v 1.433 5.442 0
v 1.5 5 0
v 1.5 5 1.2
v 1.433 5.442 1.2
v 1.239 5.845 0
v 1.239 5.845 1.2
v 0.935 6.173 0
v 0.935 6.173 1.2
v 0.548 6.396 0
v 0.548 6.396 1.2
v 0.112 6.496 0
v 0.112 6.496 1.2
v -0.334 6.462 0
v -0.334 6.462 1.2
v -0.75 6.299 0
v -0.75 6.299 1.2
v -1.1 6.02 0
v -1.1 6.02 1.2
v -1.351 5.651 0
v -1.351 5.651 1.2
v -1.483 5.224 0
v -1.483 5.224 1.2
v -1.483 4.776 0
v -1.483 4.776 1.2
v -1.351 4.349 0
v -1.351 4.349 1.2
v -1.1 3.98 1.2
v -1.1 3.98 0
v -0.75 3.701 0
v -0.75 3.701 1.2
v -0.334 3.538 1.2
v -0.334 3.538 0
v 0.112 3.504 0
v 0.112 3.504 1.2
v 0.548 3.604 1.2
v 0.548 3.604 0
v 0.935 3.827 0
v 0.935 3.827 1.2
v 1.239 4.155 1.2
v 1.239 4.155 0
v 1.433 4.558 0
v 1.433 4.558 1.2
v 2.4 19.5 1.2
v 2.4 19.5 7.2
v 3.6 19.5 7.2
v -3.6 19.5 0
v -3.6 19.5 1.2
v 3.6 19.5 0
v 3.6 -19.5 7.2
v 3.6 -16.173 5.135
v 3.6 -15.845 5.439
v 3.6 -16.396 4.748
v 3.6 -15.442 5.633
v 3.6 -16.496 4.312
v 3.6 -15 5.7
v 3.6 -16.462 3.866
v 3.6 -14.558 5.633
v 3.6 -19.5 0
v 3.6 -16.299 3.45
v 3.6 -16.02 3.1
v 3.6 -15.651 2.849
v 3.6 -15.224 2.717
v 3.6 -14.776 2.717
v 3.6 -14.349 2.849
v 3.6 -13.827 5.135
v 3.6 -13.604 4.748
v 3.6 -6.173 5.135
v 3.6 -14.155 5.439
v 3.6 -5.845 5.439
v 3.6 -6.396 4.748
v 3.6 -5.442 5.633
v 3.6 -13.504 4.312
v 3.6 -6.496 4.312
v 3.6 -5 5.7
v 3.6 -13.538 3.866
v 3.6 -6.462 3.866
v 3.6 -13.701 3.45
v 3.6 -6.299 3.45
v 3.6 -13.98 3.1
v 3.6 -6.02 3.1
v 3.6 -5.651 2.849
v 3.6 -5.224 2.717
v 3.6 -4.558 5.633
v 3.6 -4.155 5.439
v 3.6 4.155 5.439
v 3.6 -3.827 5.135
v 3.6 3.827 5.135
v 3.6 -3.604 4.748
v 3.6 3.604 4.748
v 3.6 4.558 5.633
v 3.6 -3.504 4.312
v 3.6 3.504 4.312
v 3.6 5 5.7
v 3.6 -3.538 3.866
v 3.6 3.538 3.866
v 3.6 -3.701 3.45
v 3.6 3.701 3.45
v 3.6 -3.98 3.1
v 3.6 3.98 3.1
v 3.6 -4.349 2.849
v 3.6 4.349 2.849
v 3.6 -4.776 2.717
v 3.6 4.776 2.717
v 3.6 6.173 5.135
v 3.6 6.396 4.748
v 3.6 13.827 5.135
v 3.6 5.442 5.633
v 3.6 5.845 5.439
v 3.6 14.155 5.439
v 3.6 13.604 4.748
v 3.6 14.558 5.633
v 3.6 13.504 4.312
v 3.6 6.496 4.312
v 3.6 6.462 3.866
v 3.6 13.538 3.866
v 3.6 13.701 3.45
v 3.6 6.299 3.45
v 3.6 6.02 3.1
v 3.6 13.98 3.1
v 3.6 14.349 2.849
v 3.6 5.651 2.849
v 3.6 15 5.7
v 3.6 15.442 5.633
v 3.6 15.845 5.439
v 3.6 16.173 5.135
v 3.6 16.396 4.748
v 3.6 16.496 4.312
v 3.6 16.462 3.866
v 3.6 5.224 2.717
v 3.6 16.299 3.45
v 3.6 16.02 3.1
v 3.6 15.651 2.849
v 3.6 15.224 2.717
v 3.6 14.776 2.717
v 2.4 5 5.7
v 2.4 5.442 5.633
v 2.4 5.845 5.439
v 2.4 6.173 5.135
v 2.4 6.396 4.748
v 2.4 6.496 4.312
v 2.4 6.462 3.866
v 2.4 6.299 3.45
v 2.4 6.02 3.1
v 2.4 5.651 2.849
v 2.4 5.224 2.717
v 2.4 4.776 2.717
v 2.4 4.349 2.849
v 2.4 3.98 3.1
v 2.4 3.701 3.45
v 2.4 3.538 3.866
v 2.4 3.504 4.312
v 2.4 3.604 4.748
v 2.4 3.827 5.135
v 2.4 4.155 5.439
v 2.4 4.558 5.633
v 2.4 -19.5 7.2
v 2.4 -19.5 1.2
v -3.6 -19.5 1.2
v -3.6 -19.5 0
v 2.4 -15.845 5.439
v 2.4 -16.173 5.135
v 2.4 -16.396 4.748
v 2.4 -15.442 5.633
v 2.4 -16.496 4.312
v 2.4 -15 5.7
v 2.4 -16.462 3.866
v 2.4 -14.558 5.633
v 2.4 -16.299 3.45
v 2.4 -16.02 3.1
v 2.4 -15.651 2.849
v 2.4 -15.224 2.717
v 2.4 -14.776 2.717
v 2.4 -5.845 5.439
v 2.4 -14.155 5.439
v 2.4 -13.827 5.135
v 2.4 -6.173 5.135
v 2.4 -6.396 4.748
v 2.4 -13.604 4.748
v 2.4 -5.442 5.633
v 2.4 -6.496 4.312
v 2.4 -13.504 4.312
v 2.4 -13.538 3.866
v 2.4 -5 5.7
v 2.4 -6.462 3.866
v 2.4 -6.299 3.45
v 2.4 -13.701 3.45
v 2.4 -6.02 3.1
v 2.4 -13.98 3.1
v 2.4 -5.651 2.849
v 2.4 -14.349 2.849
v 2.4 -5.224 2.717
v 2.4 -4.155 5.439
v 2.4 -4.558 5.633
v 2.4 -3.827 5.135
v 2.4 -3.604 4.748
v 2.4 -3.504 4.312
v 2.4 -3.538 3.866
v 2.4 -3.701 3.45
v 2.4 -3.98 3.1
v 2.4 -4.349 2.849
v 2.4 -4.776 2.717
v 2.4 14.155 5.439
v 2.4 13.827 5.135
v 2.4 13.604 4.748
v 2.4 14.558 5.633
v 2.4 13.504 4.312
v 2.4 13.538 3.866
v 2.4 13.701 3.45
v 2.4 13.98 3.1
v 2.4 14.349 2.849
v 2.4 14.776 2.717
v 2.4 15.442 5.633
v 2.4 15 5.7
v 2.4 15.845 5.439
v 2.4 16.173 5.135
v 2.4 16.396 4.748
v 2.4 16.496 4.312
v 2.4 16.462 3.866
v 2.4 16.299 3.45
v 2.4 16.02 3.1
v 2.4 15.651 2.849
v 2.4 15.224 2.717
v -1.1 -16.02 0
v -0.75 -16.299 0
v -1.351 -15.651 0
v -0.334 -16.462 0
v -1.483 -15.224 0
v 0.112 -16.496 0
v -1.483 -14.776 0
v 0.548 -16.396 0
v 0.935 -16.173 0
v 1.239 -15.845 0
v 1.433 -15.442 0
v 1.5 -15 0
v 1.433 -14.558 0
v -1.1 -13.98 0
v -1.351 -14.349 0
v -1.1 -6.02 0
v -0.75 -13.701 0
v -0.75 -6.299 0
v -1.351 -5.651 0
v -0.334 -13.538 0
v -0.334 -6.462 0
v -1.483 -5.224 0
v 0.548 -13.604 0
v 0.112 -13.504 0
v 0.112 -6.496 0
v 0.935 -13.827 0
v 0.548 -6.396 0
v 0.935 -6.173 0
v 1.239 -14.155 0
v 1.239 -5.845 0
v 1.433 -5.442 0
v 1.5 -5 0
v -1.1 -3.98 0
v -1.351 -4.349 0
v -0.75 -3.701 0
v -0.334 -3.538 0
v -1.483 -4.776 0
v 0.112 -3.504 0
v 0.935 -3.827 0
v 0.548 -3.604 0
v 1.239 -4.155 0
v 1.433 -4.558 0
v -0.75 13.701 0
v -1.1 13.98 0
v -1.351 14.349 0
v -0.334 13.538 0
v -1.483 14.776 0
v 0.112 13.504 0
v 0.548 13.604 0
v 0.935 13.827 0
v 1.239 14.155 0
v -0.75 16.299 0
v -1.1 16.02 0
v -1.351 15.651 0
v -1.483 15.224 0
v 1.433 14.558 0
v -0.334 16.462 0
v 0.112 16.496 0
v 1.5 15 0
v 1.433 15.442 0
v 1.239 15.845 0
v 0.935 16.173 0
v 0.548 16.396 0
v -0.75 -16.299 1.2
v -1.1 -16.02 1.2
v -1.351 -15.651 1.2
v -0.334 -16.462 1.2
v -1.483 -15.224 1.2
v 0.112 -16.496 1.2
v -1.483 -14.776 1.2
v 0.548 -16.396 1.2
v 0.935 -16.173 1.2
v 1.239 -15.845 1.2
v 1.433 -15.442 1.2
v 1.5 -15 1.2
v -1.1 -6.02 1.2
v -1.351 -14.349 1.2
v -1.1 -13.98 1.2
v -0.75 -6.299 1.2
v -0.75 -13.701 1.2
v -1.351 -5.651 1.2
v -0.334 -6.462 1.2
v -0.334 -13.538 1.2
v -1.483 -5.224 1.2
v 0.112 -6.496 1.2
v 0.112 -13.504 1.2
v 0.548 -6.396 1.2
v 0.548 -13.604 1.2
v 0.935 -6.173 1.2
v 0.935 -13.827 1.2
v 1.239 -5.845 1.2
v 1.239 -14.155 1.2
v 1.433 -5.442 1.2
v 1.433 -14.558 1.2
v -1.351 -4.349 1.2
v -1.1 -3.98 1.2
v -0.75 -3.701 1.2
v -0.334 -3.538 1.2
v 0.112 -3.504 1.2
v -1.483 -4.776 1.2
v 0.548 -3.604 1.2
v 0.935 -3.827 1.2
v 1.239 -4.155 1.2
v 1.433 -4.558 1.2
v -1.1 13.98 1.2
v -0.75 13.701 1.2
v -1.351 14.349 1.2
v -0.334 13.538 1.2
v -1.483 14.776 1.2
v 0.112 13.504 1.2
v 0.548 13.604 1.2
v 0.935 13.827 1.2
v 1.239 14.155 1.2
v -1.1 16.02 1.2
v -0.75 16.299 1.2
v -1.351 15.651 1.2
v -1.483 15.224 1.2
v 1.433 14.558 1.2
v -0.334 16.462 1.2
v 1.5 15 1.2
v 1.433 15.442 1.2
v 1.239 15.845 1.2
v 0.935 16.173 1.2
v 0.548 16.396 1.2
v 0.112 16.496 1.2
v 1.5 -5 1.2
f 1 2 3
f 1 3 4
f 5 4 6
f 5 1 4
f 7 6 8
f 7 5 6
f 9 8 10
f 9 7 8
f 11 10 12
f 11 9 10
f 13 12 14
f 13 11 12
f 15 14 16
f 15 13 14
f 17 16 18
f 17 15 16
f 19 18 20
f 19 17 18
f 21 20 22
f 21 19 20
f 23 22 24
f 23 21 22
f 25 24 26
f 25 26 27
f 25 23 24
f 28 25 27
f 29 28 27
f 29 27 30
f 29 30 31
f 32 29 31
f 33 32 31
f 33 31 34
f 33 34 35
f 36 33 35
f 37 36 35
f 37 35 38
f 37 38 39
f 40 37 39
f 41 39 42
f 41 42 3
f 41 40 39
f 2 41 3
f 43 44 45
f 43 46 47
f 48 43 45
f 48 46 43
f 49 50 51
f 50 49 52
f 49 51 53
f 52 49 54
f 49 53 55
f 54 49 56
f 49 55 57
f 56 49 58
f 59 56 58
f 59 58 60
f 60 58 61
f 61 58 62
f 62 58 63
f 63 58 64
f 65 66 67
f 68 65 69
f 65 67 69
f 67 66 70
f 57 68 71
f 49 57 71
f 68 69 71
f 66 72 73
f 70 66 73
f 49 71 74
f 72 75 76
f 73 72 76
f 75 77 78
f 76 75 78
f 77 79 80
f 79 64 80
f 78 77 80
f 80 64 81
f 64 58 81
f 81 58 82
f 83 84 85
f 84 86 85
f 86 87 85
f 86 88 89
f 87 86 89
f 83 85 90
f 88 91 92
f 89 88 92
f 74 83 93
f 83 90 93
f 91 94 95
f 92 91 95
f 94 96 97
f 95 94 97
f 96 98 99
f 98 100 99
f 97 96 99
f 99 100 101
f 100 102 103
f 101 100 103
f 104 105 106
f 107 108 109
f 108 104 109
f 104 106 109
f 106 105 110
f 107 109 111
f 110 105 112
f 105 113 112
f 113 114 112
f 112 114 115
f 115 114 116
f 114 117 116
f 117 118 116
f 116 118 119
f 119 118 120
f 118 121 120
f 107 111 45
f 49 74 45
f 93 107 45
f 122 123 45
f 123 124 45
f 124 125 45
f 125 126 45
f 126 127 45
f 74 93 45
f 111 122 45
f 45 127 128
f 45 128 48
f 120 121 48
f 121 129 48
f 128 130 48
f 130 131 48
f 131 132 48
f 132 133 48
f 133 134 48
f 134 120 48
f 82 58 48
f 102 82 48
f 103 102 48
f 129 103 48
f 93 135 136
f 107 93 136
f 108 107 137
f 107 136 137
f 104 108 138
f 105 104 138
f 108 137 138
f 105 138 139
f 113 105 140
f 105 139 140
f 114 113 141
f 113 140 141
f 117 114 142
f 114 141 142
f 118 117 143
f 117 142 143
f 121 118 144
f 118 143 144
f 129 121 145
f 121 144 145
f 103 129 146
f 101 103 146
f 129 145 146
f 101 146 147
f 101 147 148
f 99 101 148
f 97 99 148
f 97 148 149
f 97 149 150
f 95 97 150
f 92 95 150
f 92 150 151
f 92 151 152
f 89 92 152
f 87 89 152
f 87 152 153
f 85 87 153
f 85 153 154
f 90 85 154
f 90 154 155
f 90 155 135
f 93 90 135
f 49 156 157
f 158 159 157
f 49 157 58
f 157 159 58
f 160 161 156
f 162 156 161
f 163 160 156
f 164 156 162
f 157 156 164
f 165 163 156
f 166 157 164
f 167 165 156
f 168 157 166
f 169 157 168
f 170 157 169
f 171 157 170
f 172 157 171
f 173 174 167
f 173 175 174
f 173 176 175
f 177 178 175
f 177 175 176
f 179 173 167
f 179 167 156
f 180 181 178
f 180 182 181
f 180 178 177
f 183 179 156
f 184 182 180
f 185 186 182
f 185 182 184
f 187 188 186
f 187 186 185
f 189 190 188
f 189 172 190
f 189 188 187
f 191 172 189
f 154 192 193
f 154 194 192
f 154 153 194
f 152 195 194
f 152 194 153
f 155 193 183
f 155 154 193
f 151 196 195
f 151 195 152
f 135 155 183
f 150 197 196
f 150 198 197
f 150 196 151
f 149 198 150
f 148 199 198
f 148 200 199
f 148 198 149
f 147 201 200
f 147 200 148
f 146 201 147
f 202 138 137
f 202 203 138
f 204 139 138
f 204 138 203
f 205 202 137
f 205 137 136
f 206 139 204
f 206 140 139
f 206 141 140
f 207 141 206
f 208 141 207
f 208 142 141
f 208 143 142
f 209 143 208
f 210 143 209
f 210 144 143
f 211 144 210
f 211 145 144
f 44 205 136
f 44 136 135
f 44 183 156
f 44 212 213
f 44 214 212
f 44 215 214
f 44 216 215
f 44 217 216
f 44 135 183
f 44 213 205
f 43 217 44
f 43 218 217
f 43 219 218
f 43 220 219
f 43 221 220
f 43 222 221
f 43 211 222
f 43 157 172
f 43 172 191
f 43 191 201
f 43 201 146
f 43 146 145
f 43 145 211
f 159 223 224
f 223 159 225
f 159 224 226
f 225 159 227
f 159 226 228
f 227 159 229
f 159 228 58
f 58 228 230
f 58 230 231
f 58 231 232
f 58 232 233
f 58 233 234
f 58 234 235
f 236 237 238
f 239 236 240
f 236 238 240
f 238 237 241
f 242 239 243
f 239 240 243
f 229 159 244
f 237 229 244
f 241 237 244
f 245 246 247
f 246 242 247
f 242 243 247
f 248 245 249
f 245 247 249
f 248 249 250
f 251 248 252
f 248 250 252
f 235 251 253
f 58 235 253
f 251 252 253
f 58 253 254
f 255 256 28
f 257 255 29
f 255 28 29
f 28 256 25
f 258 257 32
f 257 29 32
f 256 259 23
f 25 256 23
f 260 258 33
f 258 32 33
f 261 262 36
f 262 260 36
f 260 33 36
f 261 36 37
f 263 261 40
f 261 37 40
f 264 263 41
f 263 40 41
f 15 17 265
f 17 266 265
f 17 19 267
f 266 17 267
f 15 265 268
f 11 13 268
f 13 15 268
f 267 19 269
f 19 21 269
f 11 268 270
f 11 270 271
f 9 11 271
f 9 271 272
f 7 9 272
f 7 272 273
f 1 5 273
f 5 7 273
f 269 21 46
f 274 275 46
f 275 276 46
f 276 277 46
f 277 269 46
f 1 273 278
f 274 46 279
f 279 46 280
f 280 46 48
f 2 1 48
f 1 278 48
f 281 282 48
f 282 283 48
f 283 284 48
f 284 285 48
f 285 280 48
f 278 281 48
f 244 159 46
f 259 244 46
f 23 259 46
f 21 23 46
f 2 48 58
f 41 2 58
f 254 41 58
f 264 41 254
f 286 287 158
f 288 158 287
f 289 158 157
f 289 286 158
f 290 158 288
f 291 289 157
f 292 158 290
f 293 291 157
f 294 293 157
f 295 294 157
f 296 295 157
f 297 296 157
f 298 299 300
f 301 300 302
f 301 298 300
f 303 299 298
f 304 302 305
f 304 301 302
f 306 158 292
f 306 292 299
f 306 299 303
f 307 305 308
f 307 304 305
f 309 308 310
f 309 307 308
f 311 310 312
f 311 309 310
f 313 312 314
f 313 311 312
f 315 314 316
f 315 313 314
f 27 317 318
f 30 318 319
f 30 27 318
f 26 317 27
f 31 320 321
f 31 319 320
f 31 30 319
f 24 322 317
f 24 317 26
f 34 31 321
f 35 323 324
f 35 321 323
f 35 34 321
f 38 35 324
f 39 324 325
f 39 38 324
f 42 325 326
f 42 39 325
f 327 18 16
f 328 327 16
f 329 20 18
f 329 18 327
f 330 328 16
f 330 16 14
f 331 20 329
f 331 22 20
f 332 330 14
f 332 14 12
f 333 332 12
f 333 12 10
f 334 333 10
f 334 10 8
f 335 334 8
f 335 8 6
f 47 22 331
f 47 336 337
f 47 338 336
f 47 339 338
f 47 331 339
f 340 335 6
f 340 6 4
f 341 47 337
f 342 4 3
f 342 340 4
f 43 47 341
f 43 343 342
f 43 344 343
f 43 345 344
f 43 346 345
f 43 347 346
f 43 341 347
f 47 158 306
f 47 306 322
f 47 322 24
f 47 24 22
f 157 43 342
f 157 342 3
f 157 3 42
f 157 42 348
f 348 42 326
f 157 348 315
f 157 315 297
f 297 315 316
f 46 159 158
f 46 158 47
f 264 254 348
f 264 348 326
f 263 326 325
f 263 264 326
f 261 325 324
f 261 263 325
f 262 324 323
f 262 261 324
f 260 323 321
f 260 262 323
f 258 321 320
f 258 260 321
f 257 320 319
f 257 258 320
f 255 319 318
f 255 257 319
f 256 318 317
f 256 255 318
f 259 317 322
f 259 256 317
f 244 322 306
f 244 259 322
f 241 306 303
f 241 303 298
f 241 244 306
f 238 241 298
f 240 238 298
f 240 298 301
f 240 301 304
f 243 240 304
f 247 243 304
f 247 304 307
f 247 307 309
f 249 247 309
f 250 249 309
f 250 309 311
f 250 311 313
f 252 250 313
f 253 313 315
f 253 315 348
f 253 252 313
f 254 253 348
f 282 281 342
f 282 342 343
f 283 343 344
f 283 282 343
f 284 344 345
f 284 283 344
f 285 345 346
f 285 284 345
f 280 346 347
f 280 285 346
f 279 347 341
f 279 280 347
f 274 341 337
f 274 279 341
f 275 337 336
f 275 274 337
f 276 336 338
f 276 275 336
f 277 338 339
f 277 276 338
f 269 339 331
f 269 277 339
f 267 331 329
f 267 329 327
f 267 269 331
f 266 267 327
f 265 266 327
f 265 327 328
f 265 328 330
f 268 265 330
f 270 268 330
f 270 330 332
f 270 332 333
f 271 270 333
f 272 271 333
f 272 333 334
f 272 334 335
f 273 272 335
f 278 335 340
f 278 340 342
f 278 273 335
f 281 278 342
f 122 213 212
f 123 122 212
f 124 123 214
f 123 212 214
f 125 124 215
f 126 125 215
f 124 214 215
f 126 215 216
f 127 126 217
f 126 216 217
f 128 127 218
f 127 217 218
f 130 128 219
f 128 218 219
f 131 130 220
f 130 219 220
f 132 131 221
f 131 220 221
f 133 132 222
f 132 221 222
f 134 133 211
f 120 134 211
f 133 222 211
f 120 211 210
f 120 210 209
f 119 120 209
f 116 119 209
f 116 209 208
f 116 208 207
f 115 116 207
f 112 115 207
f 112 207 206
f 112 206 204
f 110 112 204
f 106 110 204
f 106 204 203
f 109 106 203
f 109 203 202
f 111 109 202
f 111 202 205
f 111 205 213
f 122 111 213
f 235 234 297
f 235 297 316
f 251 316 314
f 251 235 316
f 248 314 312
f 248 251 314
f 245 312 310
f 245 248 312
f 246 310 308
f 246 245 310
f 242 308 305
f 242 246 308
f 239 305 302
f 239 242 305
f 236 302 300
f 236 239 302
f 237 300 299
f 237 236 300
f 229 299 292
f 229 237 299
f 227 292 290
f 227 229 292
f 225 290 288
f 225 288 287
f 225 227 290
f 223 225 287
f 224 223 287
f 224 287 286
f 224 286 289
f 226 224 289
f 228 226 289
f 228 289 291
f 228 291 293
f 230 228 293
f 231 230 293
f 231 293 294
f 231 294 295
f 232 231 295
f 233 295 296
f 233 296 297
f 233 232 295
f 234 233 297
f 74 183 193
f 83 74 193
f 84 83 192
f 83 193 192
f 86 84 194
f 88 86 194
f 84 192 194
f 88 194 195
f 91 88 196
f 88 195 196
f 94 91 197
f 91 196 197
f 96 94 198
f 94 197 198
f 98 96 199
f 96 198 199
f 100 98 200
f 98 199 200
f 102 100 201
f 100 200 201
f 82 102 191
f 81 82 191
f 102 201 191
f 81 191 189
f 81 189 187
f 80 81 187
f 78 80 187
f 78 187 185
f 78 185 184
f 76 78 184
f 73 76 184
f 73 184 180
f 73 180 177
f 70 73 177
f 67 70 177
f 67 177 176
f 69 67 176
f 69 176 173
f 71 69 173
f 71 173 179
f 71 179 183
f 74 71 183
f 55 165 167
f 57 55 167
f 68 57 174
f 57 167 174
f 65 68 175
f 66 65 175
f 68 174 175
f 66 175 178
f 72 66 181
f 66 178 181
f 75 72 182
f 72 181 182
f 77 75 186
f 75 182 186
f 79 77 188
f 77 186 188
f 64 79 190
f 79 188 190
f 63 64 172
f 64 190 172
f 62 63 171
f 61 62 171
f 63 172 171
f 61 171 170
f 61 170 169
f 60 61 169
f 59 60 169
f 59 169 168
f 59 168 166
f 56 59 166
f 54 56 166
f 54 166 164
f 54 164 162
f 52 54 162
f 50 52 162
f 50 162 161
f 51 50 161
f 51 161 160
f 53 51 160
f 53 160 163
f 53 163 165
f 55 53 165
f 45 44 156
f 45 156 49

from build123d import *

# Parameters (mm, degrees)
SKETCH1_W           = 7.2
SKETCH1_H           = 39
SKETCH1_R           = 1.5
BOSS_EXTRUDE1_DEPTH = 1.2
SKETCH2_W           = 1.2
SKETCH2_H           = 39
BOSS_EXTRUDE2_DEPTH = 6
CUT_EXTRUDE1_REACH  = 3.2
SKETCH3_R           = 1.5


with BuildPart() as part:
    # Sketch1 → Boss-Extrude1 (new body)
    with BuildSketch(Plane.XY):
        Rectangle(SKETCH1_W, SKETCH1_H)
        with Locations((0, -5)):
            Circle(SKETCH1_R, mode=Mode.SUBTRACT)
        with Locations((0, -15)):
            Circle(SKETCH1_R, mode=Mode.SUBTRACT)
        with Locations((0, 15)):
            Circle(SKETCH1_R, mode=Mode.SUBTRACT)
        with Locations((0, 5)):
            Circle(SKETCH1_R, mode=Mode.SUBTRACT)
    extrude(amount=BOSS_EXTRUDE1_DEPTH)

    # Sketch2 → Boss-Extrude2 (add)
    with BuildSketch(Plane.XY.offset(1.2)):
        with Locations((3, 0)):
            Rectangle(SKETCH2_W, SKETCH2_H)
    extrude(amount=BOSS_EXTRUDE2_DEPTH)

    # Sketch3 → Cut-Extrude1 (cut, up to next)
    with BuildSketch(Plane.ZY.offset(-2.4), mode=Mode.PRIVATE) as cut_extrude1_sk1:
        with Locations((4.2, 15)):
            Circle(SKETCH3_R)
    cut_extrude1_tool1 = extrude(cut_extrude1_sk1.sketch, amount=-CUT_EXTRUDE1_REACH, mode=Mode.PRIVATE) & part.part
    add(cut_extrude1_tool1.solids().sort_by_distance((2.4, 15, 4.2))[0], mode=Mode.SUBTRACT)
    # Sketch3 → Cut-Extrude1 (cut, up to next)
    with BuildSketch(Plane.ZY.offset(-2.4), mode=Mode.PRIVATE) as cut_extrude1_sk2:
        with Locations((4.2, 5)):
            Circle(SKETCH3_R)
    cut_extrude1_tool2 = extrude(cut_extrude1_sk2.sketch, amount=-CUT_EXTRUDE1_REACH, mode=Mode.PRIVATE) & part.part
    add(cut_extrude1_tool2.solids().sort_by_distance((2.4, 5, 4.2))[0], mode=Mode.SUBTRACT)
    # Sketch3 → Cut-Extrude1 (cut, up to next)
    with BuildSketch(Plane.ZY.offset(-2.4), mode=Mode.PRIVATE) as cut_extrude1_sk3:
        with Locations((4.2, -5)):
            Circle(SKETCH3_R)
    cut_extrude1_tool3 = extrude(cut_extrude1_sk3.sketch, amount=-CUT_EXTRUDE1_REACH, mode=Mode.PRIVATE) & part.part
    add(cut_extrude1_tool3.solids().sort_by_distance((2.4, -5, 4.2))[0], mode=Mode.SUBTRACT)
    # Sketch3 → Cut-Extrude1 (cut, up to next)
    with BuildSketch(Plane.ZY.offset(-2.4), mode=Mode.PRIVATE) as cut_extrude1_sk4:
        with Locations((4.2, -15)):
            Circle(SKETCH3_R)
    cut_extrude1_tool4 = extrude(cut_extrude1_sk4.sketch, amount=-CUT_EXTRUDE1_REACH, mode=Mode.PRIVATE) & part.part
    add(cut_extrude1_tool4.solids().sort_by_distance((2.4, -15, 4.2))[0], mode=Mode.SUBTRACT)


solid = part.part
